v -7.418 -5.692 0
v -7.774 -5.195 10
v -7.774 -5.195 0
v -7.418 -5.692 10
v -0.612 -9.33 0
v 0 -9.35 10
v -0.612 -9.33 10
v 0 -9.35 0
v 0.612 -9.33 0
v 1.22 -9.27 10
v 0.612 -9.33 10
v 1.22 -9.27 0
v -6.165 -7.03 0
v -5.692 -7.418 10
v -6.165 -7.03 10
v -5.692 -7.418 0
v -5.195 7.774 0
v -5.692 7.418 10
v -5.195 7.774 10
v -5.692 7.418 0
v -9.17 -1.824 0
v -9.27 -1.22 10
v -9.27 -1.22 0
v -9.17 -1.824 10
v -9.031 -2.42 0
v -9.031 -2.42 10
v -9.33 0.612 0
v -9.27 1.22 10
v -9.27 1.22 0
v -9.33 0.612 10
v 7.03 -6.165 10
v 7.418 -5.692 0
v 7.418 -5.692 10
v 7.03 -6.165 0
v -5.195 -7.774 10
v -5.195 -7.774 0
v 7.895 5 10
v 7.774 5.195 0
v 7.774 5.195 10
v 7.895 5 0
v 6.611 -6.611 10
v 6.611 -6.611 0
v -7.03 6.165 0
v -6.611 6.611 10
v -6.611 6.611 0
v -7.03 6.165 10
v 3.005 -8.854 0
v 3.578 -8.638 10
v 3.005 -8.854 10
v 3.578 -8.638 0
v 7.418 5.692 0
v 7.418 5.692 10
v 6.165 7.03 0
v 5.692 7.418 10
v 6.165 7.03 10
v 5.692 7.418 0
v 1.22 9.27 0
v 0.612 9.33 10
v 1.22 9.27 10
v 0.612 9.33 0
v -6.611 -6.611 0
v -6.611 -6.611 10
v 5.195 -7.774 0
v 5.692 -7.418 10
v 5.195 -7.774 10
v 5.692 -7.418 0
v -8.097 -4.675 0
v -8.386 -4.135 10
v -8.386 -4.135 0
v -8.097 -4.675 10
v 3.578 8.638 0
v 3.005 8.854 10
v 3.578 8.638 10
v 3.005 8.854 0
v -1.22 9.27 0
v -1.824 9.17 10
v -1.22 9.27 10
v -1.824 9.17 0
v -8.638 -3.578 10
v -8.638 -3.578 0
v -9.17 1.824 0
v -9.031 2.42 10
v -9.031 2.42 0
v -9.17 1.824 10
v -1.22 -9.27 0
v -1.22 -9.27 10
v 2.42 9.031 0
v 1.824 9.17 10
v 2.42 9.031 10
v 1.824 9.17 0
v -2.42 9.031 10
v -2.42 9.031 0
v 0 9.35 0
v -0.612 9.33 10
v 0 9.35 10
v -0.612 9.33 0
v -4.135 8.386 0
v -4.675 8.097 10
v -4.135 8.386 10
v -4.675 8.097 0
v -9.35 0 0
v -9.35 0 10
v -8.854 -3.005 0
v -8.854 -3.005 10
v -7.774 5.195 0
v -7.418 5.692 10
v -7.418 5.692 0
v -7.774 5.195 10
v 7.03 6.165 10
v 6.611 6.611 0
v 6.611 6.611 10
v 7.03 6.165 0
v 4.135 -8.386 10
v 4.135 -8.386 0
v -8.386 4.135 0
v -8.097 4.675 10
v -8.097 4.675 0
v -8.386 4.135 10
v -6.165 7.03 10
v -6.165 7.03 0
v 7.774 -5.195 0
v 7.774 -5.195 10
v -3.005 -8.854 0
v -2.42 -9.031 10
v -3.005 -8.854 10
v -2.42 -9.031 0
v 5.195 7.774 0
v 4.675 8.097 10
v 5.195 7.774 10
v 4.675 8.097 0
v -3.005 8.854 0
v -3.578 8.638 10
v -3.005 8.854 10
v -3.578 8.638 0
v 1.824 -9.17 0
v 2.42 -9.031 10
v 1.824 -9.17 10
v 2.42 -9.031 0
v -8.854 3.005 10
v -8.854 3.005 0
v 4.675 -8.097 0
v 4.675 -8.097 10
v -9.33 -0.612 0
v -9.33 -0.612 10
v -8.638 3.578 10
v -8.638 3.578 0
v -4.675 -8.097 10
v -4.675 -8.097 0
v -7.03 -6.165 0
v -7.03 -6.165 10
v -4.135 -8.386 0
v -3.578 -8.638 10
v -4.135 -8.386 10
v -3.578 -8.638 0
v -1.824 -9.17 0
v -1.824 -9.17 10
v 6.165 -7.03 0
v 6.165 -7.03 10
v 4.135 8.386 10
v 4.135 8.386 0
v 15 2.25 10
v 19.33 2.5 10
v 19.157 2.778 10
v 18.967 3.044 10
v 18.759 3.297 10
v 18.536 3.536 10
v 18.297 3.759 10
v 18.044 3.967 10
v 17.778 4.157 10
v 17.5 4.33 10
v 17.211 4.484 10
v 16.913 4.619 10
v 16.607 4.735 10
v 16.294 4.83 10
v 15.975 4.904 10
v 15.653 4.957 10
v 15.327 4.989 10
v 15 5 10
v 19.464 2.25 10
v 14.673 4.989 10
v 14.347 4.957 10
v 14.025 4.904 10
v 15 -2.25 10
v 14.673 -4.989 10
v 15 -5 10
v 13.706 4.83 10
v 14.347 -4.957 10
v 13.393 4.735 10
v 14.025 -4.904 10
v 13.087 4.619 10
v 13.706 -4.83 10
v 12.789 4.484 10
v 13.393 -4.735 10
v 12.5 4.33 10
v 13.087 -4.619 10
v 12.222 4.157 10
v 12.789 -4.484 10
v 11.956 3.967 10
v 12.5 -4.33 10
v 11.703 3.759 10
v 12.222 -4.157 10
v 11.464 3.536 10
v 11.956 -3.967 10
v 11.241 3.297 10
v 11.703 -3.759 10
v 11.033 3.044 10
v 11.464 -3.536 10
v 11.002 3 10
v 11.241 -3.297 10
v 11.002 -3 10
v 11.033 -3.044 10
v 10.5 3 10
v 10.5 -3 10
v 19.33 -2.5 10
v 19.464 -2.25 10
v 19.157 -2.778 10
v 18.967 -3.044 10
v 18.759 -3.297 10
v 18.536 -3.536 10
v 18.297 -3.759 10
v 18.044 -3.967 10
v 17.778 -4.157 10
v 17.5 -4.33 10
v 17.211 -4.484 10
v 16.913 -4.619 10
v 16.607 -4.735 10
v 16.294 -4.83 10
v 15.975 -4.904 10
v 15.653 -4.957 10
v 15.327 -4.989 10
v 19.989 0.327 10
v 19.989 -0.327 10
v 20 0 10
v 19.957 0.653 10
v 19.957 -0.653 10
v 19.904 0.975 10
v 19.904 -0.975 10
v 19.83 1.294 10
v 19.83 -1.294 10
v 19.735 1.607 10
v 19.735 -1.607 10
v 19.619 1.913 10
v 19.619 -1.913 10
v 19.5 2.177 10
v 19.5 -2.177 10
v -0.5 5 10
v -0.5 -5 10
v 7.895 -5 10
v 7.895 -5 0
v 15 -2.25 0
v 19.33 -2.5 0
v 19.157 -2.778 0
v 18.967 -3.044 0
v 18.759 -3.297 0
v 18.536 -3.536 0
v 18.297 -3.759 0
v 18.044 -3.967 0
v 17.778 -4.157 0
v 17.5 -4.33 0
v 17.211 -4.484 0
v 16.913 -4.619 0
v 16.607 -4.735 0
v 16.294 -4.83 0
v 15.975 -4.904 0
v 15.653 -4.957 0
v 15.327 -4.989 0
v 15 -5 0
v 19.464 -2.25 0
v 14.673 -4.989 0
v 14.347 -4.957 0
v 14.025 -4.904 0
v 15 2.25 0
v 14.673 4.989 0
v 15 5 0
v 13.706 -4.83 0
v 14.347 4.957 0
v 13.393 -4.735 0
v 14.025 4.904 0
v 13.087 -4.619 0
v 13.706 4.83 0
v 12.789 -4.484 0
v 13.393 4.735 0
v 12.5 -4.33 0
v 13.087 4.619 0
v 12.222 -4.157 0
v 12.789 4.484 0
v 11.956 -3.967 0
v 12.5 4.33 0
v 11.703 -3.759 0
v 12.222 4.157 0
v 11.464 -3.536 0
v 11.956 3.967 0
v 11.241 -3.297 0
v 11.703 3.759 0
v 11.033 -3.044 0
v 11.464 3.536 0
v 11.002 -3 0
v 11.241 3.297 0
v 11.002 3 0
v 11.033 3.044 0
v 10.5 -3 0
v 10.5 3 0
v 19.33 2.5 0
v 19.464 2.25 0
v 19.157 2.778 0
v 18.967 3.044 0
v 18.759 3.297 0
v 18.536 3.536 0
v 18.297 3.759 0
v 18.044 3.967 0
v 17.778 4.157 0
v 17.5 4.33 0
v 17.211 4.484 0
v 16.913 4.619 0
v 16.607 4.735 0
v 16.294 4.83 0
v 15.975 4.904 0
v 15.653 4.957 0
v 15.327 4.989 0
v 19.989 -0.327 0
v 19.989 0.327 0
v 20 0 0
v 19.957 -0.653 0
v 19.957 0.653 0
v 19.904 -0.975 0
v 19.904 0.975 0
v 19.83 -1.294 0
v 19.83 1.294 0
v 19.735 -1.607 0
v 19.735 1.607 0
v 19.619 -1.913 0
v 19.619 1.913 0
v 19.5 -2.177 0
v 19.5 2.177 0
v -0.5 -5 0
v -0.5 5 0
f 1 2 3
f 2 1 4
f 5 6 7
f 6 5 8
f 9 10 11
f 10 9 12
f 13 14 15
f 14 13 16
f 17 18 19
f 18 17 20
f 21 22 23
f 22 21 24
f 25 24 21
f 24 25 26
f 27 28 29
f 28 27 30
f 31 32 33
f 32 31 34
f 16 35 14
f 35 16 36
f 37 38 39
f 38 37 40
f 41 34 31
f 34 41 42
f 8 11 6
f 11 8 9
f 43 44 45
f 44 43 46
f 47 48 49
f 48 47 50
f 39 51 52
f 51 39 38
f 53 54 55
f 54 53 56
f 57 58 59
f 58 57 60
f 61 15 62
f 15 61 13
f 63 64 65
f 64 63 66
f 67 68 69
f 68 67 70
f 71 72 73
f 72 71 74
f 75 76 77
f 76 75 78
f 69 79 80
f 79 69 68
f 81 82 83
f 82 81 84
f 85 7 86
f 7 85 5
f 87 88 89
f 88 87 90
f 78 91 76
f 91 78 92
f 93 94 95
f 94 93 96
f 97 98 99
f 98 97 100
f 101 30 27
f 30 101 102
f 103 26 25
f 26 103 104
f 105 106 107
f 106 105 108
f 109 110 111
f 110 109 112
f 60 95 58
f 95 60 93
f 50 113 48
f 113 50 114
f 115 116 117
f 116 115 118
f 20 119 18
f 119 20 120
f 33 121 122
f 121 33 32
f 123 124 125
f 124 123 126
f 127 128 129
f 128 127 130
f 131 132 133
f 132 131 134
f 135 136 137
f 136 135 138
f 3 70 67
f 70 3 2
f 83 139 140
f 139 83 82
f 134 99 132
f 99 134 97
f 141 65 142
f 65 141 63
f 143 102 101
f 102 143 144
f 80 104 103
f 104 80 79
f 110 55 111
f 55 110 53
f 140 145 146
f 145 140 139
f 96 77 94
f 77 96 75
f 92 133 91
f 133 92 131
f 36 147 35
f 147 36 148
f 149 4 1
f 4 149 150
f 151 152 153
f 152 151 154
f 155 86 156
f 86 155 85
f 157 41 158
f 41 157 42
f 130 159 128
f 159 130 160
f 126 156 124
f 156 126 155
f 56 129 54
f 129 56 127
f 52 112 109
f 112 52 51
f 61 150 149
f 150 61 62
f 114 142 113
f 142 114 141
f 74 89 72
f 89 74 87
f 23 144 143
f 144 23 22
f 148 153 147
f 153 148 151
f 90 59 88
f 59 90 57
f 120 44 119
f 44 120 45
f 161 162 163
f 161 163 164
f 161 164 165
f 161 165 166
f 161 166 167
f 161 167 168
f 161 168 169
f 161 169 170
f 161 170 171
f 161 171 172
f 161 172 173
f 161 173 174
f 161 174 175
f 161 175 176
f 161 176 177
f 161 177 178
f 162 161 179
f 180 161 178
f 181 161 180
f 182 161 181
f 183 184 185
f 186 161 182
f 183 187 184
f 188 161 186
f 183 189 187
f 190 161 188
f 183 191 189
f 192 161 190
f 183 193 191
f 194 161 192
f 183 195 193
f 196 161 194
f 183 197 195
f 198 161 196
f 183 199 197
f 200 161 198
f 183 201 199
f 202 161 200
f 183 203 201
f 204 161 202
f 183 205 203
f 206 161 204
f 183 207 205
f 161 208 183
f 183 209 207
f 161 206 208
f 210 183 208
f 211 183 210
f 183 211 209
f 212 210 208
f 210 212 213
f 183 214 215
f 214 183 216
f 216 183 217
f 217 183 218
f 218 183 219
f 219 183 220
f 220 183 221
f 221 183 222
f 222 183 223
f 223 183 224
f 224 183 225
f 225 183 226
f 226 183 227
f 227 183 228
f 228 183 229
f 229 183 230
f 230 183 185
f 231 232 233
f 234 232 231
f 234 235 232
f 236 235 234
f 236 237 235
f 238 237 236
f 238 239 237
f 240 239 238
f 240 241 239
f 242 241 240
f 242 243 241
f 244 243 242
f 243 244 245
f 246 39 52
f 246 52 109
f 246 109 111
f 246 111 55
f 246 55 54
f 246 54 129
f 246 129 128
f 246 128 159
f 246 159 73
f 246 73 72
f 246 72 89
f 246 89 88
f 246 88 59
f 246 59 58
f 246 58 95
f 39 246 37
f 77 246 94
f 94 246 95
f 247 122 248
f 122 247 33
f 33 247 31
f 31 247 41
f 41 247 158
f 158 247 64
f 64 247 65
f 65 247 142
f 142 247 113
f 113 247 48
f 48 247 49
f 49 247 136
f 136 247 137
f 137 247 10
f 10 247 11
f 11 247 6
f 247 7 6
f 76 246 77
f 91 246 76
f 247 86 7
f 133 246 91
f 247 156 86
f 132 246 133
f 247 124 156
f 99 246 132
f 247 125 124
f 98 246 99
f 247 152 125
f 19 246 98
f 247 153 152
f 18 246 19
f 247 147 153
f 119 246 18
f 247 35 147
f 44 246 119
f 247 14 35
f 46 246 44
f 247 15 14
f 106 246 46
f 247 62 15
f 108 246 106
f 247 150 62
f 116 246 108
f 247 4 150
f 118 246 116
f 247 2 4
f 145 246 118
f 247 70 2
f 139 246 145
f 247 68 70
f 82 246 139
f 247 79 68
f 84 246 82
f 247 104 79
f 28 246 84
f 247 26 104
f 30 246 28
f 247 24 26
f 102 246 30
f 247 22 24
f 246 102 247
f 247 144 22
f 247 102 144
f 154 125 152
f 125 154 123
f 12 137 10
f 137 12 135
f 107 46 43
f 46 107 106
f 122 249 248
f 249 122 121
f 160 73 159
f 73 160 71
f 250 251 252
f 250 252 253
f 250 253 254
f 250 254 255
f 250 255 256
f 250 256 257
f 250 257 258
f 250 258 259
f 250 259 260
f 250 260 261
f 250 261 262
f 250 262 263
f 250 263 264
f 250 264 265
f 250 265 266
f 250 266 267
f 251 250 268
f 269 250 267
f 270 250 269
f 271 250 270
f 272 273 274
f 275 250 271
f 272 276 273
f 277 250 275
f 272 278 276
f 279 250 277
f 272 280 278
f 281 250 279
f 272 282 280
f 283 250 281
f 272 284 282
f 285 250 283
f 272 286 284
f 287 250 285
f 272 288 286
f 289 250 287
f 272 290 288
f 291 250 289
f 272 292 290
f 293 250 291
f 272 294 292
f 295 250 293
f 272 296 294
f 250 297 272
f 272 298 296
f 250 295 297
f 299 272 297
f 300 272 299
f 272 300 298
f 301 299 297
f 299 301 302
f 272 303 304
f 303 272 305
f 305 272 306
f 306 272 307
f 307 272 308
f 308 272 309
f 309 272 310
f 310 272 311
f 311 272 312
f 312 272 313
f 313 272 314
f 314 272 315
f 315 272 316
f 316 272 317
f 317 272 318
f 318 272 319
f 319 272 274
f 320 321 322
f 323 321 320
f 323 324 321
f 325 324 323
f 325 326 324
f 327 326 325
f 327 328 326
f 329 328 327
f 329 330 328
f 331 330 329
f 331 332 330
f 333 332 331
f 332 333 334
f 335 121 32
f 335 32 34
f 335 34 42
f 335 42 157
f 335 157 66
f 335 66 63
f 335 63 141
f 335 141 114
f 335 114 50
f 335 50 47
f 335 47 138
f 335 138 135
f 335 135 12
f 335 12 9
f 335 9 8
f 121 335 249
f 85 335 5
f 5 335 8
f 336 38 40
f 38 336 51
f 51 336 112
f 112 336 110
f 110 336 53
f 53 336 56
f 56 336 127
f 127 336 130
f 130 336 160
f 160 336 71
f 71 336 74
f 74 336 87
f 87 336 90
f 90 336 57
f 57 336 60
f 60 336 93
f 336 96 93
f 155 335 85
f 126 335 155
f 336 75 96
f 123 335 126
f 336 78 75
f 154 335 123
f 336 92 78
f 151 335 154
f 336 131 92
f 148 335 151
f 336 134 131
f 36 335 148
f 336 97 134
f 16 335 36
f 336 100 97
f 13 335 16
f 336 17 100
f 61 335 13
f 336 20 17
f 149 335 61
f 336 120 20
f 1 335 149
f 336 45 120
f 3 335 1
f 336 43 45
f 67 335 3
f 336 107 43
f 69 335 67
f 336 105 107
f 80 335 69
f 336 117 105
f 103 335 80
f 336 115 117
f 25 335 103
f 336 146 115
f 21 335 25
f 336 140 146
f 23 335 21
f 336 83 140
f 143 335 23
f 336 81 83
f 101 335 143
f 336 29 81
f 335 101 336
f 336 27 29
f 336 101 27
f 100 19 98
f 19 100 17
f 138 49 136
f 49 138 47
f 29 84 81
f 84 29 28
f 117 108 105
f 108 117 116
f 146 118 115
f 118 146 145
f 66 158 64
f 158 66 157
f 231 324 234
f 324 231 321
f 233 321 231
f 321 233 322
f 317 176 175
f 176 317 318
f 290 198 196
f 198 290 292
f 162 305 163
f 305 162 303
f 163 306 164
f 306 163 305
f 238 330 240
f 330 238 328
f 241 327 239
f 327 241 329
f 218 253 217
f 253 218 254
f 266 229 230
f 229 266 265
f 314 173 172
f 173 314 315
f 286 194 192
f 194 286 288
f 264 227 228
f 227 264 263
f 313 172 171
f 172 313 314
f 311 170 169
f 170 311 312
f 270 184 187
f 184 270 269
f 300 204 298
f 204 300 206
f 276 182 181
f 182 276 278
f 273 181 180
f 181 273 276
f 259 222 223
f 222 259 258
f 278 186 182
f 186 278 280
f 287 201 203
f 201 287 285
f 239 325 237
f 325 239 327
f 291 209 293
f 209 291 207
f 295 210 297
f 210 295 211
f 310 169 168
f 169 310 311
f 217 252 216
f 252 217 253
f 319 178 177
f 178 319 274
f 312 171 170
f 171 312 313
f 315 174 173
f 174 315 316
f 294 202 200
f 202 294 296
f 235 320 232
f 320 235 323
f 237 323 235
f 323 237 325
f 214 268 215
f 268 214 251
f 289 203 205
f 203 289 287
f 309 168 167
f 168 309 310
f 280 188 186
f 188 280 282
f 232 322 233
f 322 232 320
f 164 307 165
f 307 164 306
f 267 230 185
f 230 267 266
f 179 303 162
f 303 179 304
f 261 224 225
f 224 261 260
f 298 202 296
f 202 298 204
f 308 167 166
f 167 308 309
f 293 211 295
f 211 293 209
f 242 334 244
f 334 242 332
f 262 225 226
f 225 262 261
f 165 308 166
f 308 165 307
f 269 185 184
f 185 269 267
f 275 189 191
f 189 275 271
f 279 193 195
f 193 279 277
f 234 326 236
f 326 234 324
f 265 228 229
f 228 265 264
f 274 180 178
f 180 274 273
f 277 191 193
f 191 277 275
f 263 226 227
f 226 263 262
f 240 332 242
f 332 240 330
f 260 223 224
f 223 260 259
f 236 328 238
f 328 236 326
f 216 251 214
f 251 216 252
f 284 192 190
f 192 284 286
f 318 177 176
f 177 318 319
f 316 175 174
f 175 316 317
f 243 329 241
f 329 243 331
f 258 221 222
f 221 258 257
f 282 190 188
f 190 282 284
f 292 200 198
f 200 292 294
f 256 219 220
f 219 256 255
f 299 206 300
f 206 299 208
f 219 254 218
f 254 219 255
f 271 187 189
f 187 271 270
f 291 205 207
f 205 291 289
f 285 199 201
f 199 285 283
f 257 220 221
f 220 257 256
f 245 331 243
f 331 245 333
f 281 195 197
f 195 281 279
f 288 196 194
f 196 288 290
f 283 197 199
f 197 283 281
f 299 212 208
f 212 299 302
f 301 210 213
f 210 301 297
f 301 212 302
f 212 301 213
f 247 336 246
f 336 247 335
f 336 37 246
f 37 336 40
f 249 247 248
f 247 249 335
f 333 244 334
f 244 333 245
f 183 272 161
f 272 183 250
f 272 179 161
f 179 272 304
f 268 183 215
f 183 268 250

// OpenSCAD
// Tubing clip for 12.7 mm (1/2 inch) lab stand rod
// Print orientation: flat, extruded along Z (height = 10 mm)

// ---------------- Parameters ----------------
extrusion_height   = 10;    // Z height of the part (mm)
rod_d              = 12.7;  // stand rod inner diameter (mm)
rod_wall           = 3;     // stand rod ring wall thickness (mm)
rod_opening_w      = 10;    // width of the -X side opening (mm)

tubing_d           = 6;     // tubing inner diameter (mm)
tubing_wall        = 2;     // tubing ring wall thickness (mm)
tubing_opening_w   = 4.5;   // width of the +X side opening (mm)

bridge_w           = 6;     // bridge width in Y (mm)
bridge_x_start     = 8;     // bridge start in X (mm)
bridge_x_end       = 12;    // bridge end in X (mm)

eps                = 0.5;   // cutter overshoot past faces (mm)
$fn                = 96;    // curve resolution

// ---------------- Derived ----------------
rod_outer = rod_d + 2 * rod_wall;   // 18.7 mm
tubing_outer = tubing_d + 2 * tubing_wall;   // 10 mm
tubing_opening_half_w = tubing_opening_w / 2;   // 2.25 mm

// ---------------- Model ----------------
difference() {
    union() {
        // Rod ring
        cylinder(h = extrusion_height, d = rod_outer);
        // Tubing ring
        translate([15, 0, 0])
            cylinder(h = extrusion_height, d = tubing_outer);
        // Solid bridge (does not block either hole)
        translate([bridge_x_start, -bridge_w / 2, 0])
            cube([bridge_x_end - bridge_x_start, bridge_w, extrusion_height]);
    }
    // Opening in the rod ring: x < 0 and -5 < y < 5
    translate([-eps, -5, 0])
        cube([rod_opening_w + 2 * eps, 10, extrusion_height]);
    // Opening in the tubing ring: x > 15 and -2.25 < y < 2.25
    translate([15, -tubing_opening_half_w, 0])
        cube([tubing_opening_w, tubing_opening_w, extrusion_height]);
}
